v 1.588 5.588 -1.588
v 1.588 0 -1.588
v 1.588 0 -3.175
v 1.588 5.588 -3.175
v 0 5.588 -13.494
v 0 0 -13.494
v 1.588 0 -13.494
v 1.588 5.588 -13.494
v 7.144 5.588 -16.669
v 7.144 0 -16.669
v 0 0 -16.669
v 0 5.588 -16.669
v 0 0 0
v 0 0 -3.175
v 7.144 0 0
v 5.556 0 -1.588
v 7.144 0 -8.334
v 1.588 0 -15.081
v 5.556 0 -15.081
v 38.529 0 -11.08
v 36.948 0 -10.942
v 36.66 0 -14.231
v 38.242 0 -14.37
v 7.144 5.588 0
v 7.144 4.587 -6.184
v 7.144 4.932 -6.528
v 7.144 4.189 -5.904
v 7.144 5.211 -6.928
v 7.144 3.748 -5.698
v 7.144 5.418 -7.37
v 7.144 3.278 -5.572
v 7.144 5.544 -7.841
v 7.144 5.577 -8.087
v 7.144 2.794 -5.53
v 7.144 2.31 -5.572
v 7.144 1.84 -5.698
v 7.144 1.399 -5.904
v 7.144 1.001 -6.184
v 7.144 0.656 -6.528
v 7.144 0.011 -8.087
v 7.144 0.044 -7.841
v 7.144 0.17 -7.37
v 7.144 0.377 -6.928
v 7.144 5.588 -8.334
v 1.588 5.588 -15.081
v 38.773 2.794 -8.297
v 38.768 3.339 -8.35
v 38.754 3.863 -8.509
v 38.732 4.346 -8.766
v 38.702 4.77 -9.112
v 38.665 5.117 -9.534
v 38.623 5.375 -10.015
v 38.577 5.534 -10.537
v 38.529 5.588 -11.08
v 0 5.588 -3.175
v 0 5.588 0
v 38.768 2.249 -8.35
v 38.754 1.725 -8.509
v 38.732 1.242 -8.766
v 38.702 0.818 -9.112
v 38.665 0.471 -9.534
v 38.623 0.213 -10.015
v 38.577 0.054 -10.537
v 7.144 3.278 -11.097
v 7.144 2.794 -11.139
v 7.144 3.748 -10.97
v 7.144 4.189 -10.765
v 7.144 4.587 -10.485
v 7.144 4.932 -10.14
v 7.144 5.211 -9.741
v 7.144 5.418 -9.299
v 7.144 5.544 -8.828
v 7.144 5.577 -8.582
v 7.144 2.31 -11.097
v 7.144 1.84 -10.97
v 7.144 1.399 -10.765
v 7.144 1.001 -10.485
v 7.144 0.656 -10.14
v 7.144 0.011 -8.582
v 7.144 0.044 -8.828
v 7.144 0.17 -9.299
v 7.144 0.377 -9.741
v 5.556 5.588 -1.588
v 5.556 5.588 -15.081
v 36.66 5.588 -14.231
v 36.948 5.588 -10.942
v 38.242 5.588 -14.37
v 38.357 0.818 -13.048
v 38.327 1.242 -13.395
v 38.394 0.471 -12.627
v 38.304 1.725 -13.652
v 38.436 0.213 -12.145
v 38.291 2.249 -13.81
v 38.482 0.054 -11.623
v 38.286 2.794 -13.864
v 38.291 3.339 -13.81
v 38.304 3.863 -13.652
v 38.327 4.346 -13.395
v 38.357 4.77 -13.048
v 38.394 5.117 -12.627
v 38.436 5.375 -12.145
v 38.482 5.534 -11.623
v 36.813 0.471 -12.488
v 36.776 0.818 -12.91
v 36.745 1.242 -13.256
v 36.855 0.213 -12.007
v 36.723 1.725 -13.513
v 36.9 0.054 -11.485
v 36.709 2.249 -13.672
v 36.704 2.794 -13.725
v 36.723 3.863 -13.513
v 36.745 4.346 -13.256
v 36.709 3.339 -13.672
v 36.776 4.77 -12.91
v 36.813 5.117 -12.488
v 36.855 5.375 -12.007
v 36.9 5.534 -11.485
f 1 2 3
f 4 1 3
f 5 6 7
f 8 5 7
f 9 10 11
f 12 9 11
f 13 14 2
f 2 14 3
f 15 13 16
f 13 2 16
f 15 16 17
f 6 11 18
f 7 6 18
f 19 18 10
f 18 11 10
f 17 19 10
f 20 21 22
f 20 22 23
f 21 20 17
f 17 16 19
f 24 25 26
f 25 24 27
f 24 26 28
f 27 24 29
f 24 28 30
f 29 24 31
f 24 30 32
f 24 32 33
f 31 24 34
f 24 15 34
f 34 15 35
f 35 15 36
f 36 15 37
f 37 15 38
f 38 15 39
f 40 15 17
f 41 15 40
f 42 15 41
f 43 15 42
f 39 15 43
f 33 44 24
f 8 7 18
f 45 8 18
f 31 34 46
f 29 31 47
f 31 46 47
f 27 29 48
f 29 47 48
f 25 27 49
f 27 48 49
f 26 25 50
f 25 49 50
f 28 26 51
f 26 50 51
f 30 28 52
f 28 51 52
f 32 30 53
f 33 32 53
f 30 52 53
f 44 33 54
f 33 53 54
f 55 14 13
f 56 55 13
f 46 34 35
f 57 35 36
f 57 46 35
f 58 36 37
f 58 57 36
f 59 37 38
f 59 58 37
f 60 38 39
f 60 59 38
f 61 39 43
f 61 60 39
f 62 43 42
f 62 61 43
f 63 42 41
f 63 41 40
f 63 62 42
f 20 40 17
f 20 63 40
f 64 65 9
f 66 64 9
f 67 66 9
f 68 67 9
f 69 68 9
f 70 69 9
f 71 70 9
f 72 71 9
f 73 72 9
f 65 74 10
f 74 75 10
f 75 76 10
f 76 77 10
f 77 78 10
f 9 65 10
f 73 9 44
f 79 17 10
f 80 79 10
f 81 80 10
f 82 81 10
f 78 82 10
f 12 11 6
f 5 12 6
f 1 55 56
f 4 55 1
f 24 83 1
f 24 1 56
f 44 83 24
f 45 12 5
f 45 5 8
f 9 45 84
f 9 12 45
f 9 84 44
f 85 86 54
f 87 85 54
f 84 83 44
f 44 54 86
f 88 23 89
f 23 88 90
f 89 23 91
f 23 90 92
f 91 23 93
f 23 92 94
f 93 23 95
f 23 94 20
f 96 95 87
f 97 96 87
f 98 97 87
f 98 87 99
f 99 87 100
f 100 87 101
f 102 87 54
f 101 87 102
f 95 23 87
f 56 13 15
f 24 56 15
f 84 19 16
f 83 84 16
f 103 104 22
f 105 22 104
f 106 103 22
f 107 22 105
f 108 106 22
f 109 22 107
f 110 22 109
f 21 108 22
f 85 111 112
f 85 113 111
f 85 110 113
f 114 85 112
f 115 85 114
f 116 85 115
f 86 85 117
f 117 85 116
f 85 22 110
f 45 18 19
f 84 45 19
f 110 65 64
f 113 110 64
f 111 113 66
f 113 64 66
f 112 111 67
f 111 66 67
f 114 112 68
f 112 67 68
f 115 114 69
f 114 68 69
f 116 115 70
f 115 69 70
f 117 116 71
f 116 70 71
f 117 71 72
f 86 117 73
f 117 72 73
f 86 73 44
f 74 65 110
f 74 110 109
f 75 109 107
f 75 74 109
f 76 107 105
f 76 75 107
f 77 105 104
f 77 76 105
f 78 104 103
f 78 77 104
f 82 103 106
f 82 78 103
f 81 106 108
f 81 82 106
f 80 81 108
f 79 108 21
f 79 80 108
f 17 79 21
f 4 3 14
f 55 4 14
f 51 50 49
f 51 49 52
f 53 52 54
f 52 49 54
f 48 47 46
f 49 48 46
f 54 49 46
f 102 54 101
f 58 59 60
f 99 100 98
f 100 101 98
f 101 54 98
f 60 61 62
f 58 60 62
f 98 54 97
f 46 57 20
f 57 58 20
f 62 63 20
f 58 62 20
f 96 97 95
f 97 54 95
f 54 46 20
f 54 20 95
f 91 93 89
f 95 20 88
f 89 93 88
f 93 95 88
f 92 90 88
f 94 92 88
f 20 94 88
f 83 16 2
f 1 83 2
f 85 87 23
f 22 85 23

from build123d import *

# Parameters (mm, degrees)
BOSS_EXTRUDE1_DEPTH = 5.588
FILLET1_R           = 2.794
BOSS_EXTRUDE2_DEPTH = 1.5875


with BuildPart() as part:
    # Sketch1 → Boss-Extrude1 (new body)
    with BuildSketch(Plane(origin=(0, 0, 0), x_dir=(1, 0, 0), z_dir=(0, 1, 0))):
        Polygon((0, 0), (7.14375, 0), (7.14375, 5.529702374), (38.772931664, 8.296897206), (38.285905374, 13.863633179), (7.14375, 11.139047626), (7.14375, 16.66875), (0, 16.66875), (0, 13.49375), (1.5875, 13.49375), (1.5875, 15.08125), (5.55625, 15.08125), (5.55625, 1.5875), (1.5875, 1.5875), (1.5875, 3.175), (0, 3.175), align=None)
    extrude(amount=BOSS_EXTRUDE1_DEPTH)

    # Fillet1
    fillet1_edges = [part.edges().sort_by_distance(p)[0] for p in [
        (22.958340832, 0, -6.91329979),
        (22.714827687, 0, -12.501340403),
        (22.958340832, 5.588, -6.91329979),
        (22.714827687, 5.588, -12.501340403),
    ]]
    fillet(fillet1_edges, radius=FILLET1_R - 0.0001)  # a hair under: the kernel refuses the full size

    # Sketch2 → Boss-Extrude2 (add)
    with BuildSketch(Plane(origin=(39.198778227, 0, -3.429448719), x_dir=(-0.08715574274766254, 0, -0.9961946980917452), z_dir=(0.9961946980917452, 0, -0.08715574274766254))):
        with BuildLine():
            Line((7.68004135, 5.588), (10.98204135, 5.588))
            Line((10.98204135, 5.588), (10.98204135, 0))
            Line((10.98204135, 0), (7.68004135, 0))
            ThreePointArc((7.68004135, 0), (4.88604135, 2.794), (7.68004135, 5.588))
        make_face()
    extrude(amount=-BOSS_EXTRUDE2_DEPTH)


solid = part.part
